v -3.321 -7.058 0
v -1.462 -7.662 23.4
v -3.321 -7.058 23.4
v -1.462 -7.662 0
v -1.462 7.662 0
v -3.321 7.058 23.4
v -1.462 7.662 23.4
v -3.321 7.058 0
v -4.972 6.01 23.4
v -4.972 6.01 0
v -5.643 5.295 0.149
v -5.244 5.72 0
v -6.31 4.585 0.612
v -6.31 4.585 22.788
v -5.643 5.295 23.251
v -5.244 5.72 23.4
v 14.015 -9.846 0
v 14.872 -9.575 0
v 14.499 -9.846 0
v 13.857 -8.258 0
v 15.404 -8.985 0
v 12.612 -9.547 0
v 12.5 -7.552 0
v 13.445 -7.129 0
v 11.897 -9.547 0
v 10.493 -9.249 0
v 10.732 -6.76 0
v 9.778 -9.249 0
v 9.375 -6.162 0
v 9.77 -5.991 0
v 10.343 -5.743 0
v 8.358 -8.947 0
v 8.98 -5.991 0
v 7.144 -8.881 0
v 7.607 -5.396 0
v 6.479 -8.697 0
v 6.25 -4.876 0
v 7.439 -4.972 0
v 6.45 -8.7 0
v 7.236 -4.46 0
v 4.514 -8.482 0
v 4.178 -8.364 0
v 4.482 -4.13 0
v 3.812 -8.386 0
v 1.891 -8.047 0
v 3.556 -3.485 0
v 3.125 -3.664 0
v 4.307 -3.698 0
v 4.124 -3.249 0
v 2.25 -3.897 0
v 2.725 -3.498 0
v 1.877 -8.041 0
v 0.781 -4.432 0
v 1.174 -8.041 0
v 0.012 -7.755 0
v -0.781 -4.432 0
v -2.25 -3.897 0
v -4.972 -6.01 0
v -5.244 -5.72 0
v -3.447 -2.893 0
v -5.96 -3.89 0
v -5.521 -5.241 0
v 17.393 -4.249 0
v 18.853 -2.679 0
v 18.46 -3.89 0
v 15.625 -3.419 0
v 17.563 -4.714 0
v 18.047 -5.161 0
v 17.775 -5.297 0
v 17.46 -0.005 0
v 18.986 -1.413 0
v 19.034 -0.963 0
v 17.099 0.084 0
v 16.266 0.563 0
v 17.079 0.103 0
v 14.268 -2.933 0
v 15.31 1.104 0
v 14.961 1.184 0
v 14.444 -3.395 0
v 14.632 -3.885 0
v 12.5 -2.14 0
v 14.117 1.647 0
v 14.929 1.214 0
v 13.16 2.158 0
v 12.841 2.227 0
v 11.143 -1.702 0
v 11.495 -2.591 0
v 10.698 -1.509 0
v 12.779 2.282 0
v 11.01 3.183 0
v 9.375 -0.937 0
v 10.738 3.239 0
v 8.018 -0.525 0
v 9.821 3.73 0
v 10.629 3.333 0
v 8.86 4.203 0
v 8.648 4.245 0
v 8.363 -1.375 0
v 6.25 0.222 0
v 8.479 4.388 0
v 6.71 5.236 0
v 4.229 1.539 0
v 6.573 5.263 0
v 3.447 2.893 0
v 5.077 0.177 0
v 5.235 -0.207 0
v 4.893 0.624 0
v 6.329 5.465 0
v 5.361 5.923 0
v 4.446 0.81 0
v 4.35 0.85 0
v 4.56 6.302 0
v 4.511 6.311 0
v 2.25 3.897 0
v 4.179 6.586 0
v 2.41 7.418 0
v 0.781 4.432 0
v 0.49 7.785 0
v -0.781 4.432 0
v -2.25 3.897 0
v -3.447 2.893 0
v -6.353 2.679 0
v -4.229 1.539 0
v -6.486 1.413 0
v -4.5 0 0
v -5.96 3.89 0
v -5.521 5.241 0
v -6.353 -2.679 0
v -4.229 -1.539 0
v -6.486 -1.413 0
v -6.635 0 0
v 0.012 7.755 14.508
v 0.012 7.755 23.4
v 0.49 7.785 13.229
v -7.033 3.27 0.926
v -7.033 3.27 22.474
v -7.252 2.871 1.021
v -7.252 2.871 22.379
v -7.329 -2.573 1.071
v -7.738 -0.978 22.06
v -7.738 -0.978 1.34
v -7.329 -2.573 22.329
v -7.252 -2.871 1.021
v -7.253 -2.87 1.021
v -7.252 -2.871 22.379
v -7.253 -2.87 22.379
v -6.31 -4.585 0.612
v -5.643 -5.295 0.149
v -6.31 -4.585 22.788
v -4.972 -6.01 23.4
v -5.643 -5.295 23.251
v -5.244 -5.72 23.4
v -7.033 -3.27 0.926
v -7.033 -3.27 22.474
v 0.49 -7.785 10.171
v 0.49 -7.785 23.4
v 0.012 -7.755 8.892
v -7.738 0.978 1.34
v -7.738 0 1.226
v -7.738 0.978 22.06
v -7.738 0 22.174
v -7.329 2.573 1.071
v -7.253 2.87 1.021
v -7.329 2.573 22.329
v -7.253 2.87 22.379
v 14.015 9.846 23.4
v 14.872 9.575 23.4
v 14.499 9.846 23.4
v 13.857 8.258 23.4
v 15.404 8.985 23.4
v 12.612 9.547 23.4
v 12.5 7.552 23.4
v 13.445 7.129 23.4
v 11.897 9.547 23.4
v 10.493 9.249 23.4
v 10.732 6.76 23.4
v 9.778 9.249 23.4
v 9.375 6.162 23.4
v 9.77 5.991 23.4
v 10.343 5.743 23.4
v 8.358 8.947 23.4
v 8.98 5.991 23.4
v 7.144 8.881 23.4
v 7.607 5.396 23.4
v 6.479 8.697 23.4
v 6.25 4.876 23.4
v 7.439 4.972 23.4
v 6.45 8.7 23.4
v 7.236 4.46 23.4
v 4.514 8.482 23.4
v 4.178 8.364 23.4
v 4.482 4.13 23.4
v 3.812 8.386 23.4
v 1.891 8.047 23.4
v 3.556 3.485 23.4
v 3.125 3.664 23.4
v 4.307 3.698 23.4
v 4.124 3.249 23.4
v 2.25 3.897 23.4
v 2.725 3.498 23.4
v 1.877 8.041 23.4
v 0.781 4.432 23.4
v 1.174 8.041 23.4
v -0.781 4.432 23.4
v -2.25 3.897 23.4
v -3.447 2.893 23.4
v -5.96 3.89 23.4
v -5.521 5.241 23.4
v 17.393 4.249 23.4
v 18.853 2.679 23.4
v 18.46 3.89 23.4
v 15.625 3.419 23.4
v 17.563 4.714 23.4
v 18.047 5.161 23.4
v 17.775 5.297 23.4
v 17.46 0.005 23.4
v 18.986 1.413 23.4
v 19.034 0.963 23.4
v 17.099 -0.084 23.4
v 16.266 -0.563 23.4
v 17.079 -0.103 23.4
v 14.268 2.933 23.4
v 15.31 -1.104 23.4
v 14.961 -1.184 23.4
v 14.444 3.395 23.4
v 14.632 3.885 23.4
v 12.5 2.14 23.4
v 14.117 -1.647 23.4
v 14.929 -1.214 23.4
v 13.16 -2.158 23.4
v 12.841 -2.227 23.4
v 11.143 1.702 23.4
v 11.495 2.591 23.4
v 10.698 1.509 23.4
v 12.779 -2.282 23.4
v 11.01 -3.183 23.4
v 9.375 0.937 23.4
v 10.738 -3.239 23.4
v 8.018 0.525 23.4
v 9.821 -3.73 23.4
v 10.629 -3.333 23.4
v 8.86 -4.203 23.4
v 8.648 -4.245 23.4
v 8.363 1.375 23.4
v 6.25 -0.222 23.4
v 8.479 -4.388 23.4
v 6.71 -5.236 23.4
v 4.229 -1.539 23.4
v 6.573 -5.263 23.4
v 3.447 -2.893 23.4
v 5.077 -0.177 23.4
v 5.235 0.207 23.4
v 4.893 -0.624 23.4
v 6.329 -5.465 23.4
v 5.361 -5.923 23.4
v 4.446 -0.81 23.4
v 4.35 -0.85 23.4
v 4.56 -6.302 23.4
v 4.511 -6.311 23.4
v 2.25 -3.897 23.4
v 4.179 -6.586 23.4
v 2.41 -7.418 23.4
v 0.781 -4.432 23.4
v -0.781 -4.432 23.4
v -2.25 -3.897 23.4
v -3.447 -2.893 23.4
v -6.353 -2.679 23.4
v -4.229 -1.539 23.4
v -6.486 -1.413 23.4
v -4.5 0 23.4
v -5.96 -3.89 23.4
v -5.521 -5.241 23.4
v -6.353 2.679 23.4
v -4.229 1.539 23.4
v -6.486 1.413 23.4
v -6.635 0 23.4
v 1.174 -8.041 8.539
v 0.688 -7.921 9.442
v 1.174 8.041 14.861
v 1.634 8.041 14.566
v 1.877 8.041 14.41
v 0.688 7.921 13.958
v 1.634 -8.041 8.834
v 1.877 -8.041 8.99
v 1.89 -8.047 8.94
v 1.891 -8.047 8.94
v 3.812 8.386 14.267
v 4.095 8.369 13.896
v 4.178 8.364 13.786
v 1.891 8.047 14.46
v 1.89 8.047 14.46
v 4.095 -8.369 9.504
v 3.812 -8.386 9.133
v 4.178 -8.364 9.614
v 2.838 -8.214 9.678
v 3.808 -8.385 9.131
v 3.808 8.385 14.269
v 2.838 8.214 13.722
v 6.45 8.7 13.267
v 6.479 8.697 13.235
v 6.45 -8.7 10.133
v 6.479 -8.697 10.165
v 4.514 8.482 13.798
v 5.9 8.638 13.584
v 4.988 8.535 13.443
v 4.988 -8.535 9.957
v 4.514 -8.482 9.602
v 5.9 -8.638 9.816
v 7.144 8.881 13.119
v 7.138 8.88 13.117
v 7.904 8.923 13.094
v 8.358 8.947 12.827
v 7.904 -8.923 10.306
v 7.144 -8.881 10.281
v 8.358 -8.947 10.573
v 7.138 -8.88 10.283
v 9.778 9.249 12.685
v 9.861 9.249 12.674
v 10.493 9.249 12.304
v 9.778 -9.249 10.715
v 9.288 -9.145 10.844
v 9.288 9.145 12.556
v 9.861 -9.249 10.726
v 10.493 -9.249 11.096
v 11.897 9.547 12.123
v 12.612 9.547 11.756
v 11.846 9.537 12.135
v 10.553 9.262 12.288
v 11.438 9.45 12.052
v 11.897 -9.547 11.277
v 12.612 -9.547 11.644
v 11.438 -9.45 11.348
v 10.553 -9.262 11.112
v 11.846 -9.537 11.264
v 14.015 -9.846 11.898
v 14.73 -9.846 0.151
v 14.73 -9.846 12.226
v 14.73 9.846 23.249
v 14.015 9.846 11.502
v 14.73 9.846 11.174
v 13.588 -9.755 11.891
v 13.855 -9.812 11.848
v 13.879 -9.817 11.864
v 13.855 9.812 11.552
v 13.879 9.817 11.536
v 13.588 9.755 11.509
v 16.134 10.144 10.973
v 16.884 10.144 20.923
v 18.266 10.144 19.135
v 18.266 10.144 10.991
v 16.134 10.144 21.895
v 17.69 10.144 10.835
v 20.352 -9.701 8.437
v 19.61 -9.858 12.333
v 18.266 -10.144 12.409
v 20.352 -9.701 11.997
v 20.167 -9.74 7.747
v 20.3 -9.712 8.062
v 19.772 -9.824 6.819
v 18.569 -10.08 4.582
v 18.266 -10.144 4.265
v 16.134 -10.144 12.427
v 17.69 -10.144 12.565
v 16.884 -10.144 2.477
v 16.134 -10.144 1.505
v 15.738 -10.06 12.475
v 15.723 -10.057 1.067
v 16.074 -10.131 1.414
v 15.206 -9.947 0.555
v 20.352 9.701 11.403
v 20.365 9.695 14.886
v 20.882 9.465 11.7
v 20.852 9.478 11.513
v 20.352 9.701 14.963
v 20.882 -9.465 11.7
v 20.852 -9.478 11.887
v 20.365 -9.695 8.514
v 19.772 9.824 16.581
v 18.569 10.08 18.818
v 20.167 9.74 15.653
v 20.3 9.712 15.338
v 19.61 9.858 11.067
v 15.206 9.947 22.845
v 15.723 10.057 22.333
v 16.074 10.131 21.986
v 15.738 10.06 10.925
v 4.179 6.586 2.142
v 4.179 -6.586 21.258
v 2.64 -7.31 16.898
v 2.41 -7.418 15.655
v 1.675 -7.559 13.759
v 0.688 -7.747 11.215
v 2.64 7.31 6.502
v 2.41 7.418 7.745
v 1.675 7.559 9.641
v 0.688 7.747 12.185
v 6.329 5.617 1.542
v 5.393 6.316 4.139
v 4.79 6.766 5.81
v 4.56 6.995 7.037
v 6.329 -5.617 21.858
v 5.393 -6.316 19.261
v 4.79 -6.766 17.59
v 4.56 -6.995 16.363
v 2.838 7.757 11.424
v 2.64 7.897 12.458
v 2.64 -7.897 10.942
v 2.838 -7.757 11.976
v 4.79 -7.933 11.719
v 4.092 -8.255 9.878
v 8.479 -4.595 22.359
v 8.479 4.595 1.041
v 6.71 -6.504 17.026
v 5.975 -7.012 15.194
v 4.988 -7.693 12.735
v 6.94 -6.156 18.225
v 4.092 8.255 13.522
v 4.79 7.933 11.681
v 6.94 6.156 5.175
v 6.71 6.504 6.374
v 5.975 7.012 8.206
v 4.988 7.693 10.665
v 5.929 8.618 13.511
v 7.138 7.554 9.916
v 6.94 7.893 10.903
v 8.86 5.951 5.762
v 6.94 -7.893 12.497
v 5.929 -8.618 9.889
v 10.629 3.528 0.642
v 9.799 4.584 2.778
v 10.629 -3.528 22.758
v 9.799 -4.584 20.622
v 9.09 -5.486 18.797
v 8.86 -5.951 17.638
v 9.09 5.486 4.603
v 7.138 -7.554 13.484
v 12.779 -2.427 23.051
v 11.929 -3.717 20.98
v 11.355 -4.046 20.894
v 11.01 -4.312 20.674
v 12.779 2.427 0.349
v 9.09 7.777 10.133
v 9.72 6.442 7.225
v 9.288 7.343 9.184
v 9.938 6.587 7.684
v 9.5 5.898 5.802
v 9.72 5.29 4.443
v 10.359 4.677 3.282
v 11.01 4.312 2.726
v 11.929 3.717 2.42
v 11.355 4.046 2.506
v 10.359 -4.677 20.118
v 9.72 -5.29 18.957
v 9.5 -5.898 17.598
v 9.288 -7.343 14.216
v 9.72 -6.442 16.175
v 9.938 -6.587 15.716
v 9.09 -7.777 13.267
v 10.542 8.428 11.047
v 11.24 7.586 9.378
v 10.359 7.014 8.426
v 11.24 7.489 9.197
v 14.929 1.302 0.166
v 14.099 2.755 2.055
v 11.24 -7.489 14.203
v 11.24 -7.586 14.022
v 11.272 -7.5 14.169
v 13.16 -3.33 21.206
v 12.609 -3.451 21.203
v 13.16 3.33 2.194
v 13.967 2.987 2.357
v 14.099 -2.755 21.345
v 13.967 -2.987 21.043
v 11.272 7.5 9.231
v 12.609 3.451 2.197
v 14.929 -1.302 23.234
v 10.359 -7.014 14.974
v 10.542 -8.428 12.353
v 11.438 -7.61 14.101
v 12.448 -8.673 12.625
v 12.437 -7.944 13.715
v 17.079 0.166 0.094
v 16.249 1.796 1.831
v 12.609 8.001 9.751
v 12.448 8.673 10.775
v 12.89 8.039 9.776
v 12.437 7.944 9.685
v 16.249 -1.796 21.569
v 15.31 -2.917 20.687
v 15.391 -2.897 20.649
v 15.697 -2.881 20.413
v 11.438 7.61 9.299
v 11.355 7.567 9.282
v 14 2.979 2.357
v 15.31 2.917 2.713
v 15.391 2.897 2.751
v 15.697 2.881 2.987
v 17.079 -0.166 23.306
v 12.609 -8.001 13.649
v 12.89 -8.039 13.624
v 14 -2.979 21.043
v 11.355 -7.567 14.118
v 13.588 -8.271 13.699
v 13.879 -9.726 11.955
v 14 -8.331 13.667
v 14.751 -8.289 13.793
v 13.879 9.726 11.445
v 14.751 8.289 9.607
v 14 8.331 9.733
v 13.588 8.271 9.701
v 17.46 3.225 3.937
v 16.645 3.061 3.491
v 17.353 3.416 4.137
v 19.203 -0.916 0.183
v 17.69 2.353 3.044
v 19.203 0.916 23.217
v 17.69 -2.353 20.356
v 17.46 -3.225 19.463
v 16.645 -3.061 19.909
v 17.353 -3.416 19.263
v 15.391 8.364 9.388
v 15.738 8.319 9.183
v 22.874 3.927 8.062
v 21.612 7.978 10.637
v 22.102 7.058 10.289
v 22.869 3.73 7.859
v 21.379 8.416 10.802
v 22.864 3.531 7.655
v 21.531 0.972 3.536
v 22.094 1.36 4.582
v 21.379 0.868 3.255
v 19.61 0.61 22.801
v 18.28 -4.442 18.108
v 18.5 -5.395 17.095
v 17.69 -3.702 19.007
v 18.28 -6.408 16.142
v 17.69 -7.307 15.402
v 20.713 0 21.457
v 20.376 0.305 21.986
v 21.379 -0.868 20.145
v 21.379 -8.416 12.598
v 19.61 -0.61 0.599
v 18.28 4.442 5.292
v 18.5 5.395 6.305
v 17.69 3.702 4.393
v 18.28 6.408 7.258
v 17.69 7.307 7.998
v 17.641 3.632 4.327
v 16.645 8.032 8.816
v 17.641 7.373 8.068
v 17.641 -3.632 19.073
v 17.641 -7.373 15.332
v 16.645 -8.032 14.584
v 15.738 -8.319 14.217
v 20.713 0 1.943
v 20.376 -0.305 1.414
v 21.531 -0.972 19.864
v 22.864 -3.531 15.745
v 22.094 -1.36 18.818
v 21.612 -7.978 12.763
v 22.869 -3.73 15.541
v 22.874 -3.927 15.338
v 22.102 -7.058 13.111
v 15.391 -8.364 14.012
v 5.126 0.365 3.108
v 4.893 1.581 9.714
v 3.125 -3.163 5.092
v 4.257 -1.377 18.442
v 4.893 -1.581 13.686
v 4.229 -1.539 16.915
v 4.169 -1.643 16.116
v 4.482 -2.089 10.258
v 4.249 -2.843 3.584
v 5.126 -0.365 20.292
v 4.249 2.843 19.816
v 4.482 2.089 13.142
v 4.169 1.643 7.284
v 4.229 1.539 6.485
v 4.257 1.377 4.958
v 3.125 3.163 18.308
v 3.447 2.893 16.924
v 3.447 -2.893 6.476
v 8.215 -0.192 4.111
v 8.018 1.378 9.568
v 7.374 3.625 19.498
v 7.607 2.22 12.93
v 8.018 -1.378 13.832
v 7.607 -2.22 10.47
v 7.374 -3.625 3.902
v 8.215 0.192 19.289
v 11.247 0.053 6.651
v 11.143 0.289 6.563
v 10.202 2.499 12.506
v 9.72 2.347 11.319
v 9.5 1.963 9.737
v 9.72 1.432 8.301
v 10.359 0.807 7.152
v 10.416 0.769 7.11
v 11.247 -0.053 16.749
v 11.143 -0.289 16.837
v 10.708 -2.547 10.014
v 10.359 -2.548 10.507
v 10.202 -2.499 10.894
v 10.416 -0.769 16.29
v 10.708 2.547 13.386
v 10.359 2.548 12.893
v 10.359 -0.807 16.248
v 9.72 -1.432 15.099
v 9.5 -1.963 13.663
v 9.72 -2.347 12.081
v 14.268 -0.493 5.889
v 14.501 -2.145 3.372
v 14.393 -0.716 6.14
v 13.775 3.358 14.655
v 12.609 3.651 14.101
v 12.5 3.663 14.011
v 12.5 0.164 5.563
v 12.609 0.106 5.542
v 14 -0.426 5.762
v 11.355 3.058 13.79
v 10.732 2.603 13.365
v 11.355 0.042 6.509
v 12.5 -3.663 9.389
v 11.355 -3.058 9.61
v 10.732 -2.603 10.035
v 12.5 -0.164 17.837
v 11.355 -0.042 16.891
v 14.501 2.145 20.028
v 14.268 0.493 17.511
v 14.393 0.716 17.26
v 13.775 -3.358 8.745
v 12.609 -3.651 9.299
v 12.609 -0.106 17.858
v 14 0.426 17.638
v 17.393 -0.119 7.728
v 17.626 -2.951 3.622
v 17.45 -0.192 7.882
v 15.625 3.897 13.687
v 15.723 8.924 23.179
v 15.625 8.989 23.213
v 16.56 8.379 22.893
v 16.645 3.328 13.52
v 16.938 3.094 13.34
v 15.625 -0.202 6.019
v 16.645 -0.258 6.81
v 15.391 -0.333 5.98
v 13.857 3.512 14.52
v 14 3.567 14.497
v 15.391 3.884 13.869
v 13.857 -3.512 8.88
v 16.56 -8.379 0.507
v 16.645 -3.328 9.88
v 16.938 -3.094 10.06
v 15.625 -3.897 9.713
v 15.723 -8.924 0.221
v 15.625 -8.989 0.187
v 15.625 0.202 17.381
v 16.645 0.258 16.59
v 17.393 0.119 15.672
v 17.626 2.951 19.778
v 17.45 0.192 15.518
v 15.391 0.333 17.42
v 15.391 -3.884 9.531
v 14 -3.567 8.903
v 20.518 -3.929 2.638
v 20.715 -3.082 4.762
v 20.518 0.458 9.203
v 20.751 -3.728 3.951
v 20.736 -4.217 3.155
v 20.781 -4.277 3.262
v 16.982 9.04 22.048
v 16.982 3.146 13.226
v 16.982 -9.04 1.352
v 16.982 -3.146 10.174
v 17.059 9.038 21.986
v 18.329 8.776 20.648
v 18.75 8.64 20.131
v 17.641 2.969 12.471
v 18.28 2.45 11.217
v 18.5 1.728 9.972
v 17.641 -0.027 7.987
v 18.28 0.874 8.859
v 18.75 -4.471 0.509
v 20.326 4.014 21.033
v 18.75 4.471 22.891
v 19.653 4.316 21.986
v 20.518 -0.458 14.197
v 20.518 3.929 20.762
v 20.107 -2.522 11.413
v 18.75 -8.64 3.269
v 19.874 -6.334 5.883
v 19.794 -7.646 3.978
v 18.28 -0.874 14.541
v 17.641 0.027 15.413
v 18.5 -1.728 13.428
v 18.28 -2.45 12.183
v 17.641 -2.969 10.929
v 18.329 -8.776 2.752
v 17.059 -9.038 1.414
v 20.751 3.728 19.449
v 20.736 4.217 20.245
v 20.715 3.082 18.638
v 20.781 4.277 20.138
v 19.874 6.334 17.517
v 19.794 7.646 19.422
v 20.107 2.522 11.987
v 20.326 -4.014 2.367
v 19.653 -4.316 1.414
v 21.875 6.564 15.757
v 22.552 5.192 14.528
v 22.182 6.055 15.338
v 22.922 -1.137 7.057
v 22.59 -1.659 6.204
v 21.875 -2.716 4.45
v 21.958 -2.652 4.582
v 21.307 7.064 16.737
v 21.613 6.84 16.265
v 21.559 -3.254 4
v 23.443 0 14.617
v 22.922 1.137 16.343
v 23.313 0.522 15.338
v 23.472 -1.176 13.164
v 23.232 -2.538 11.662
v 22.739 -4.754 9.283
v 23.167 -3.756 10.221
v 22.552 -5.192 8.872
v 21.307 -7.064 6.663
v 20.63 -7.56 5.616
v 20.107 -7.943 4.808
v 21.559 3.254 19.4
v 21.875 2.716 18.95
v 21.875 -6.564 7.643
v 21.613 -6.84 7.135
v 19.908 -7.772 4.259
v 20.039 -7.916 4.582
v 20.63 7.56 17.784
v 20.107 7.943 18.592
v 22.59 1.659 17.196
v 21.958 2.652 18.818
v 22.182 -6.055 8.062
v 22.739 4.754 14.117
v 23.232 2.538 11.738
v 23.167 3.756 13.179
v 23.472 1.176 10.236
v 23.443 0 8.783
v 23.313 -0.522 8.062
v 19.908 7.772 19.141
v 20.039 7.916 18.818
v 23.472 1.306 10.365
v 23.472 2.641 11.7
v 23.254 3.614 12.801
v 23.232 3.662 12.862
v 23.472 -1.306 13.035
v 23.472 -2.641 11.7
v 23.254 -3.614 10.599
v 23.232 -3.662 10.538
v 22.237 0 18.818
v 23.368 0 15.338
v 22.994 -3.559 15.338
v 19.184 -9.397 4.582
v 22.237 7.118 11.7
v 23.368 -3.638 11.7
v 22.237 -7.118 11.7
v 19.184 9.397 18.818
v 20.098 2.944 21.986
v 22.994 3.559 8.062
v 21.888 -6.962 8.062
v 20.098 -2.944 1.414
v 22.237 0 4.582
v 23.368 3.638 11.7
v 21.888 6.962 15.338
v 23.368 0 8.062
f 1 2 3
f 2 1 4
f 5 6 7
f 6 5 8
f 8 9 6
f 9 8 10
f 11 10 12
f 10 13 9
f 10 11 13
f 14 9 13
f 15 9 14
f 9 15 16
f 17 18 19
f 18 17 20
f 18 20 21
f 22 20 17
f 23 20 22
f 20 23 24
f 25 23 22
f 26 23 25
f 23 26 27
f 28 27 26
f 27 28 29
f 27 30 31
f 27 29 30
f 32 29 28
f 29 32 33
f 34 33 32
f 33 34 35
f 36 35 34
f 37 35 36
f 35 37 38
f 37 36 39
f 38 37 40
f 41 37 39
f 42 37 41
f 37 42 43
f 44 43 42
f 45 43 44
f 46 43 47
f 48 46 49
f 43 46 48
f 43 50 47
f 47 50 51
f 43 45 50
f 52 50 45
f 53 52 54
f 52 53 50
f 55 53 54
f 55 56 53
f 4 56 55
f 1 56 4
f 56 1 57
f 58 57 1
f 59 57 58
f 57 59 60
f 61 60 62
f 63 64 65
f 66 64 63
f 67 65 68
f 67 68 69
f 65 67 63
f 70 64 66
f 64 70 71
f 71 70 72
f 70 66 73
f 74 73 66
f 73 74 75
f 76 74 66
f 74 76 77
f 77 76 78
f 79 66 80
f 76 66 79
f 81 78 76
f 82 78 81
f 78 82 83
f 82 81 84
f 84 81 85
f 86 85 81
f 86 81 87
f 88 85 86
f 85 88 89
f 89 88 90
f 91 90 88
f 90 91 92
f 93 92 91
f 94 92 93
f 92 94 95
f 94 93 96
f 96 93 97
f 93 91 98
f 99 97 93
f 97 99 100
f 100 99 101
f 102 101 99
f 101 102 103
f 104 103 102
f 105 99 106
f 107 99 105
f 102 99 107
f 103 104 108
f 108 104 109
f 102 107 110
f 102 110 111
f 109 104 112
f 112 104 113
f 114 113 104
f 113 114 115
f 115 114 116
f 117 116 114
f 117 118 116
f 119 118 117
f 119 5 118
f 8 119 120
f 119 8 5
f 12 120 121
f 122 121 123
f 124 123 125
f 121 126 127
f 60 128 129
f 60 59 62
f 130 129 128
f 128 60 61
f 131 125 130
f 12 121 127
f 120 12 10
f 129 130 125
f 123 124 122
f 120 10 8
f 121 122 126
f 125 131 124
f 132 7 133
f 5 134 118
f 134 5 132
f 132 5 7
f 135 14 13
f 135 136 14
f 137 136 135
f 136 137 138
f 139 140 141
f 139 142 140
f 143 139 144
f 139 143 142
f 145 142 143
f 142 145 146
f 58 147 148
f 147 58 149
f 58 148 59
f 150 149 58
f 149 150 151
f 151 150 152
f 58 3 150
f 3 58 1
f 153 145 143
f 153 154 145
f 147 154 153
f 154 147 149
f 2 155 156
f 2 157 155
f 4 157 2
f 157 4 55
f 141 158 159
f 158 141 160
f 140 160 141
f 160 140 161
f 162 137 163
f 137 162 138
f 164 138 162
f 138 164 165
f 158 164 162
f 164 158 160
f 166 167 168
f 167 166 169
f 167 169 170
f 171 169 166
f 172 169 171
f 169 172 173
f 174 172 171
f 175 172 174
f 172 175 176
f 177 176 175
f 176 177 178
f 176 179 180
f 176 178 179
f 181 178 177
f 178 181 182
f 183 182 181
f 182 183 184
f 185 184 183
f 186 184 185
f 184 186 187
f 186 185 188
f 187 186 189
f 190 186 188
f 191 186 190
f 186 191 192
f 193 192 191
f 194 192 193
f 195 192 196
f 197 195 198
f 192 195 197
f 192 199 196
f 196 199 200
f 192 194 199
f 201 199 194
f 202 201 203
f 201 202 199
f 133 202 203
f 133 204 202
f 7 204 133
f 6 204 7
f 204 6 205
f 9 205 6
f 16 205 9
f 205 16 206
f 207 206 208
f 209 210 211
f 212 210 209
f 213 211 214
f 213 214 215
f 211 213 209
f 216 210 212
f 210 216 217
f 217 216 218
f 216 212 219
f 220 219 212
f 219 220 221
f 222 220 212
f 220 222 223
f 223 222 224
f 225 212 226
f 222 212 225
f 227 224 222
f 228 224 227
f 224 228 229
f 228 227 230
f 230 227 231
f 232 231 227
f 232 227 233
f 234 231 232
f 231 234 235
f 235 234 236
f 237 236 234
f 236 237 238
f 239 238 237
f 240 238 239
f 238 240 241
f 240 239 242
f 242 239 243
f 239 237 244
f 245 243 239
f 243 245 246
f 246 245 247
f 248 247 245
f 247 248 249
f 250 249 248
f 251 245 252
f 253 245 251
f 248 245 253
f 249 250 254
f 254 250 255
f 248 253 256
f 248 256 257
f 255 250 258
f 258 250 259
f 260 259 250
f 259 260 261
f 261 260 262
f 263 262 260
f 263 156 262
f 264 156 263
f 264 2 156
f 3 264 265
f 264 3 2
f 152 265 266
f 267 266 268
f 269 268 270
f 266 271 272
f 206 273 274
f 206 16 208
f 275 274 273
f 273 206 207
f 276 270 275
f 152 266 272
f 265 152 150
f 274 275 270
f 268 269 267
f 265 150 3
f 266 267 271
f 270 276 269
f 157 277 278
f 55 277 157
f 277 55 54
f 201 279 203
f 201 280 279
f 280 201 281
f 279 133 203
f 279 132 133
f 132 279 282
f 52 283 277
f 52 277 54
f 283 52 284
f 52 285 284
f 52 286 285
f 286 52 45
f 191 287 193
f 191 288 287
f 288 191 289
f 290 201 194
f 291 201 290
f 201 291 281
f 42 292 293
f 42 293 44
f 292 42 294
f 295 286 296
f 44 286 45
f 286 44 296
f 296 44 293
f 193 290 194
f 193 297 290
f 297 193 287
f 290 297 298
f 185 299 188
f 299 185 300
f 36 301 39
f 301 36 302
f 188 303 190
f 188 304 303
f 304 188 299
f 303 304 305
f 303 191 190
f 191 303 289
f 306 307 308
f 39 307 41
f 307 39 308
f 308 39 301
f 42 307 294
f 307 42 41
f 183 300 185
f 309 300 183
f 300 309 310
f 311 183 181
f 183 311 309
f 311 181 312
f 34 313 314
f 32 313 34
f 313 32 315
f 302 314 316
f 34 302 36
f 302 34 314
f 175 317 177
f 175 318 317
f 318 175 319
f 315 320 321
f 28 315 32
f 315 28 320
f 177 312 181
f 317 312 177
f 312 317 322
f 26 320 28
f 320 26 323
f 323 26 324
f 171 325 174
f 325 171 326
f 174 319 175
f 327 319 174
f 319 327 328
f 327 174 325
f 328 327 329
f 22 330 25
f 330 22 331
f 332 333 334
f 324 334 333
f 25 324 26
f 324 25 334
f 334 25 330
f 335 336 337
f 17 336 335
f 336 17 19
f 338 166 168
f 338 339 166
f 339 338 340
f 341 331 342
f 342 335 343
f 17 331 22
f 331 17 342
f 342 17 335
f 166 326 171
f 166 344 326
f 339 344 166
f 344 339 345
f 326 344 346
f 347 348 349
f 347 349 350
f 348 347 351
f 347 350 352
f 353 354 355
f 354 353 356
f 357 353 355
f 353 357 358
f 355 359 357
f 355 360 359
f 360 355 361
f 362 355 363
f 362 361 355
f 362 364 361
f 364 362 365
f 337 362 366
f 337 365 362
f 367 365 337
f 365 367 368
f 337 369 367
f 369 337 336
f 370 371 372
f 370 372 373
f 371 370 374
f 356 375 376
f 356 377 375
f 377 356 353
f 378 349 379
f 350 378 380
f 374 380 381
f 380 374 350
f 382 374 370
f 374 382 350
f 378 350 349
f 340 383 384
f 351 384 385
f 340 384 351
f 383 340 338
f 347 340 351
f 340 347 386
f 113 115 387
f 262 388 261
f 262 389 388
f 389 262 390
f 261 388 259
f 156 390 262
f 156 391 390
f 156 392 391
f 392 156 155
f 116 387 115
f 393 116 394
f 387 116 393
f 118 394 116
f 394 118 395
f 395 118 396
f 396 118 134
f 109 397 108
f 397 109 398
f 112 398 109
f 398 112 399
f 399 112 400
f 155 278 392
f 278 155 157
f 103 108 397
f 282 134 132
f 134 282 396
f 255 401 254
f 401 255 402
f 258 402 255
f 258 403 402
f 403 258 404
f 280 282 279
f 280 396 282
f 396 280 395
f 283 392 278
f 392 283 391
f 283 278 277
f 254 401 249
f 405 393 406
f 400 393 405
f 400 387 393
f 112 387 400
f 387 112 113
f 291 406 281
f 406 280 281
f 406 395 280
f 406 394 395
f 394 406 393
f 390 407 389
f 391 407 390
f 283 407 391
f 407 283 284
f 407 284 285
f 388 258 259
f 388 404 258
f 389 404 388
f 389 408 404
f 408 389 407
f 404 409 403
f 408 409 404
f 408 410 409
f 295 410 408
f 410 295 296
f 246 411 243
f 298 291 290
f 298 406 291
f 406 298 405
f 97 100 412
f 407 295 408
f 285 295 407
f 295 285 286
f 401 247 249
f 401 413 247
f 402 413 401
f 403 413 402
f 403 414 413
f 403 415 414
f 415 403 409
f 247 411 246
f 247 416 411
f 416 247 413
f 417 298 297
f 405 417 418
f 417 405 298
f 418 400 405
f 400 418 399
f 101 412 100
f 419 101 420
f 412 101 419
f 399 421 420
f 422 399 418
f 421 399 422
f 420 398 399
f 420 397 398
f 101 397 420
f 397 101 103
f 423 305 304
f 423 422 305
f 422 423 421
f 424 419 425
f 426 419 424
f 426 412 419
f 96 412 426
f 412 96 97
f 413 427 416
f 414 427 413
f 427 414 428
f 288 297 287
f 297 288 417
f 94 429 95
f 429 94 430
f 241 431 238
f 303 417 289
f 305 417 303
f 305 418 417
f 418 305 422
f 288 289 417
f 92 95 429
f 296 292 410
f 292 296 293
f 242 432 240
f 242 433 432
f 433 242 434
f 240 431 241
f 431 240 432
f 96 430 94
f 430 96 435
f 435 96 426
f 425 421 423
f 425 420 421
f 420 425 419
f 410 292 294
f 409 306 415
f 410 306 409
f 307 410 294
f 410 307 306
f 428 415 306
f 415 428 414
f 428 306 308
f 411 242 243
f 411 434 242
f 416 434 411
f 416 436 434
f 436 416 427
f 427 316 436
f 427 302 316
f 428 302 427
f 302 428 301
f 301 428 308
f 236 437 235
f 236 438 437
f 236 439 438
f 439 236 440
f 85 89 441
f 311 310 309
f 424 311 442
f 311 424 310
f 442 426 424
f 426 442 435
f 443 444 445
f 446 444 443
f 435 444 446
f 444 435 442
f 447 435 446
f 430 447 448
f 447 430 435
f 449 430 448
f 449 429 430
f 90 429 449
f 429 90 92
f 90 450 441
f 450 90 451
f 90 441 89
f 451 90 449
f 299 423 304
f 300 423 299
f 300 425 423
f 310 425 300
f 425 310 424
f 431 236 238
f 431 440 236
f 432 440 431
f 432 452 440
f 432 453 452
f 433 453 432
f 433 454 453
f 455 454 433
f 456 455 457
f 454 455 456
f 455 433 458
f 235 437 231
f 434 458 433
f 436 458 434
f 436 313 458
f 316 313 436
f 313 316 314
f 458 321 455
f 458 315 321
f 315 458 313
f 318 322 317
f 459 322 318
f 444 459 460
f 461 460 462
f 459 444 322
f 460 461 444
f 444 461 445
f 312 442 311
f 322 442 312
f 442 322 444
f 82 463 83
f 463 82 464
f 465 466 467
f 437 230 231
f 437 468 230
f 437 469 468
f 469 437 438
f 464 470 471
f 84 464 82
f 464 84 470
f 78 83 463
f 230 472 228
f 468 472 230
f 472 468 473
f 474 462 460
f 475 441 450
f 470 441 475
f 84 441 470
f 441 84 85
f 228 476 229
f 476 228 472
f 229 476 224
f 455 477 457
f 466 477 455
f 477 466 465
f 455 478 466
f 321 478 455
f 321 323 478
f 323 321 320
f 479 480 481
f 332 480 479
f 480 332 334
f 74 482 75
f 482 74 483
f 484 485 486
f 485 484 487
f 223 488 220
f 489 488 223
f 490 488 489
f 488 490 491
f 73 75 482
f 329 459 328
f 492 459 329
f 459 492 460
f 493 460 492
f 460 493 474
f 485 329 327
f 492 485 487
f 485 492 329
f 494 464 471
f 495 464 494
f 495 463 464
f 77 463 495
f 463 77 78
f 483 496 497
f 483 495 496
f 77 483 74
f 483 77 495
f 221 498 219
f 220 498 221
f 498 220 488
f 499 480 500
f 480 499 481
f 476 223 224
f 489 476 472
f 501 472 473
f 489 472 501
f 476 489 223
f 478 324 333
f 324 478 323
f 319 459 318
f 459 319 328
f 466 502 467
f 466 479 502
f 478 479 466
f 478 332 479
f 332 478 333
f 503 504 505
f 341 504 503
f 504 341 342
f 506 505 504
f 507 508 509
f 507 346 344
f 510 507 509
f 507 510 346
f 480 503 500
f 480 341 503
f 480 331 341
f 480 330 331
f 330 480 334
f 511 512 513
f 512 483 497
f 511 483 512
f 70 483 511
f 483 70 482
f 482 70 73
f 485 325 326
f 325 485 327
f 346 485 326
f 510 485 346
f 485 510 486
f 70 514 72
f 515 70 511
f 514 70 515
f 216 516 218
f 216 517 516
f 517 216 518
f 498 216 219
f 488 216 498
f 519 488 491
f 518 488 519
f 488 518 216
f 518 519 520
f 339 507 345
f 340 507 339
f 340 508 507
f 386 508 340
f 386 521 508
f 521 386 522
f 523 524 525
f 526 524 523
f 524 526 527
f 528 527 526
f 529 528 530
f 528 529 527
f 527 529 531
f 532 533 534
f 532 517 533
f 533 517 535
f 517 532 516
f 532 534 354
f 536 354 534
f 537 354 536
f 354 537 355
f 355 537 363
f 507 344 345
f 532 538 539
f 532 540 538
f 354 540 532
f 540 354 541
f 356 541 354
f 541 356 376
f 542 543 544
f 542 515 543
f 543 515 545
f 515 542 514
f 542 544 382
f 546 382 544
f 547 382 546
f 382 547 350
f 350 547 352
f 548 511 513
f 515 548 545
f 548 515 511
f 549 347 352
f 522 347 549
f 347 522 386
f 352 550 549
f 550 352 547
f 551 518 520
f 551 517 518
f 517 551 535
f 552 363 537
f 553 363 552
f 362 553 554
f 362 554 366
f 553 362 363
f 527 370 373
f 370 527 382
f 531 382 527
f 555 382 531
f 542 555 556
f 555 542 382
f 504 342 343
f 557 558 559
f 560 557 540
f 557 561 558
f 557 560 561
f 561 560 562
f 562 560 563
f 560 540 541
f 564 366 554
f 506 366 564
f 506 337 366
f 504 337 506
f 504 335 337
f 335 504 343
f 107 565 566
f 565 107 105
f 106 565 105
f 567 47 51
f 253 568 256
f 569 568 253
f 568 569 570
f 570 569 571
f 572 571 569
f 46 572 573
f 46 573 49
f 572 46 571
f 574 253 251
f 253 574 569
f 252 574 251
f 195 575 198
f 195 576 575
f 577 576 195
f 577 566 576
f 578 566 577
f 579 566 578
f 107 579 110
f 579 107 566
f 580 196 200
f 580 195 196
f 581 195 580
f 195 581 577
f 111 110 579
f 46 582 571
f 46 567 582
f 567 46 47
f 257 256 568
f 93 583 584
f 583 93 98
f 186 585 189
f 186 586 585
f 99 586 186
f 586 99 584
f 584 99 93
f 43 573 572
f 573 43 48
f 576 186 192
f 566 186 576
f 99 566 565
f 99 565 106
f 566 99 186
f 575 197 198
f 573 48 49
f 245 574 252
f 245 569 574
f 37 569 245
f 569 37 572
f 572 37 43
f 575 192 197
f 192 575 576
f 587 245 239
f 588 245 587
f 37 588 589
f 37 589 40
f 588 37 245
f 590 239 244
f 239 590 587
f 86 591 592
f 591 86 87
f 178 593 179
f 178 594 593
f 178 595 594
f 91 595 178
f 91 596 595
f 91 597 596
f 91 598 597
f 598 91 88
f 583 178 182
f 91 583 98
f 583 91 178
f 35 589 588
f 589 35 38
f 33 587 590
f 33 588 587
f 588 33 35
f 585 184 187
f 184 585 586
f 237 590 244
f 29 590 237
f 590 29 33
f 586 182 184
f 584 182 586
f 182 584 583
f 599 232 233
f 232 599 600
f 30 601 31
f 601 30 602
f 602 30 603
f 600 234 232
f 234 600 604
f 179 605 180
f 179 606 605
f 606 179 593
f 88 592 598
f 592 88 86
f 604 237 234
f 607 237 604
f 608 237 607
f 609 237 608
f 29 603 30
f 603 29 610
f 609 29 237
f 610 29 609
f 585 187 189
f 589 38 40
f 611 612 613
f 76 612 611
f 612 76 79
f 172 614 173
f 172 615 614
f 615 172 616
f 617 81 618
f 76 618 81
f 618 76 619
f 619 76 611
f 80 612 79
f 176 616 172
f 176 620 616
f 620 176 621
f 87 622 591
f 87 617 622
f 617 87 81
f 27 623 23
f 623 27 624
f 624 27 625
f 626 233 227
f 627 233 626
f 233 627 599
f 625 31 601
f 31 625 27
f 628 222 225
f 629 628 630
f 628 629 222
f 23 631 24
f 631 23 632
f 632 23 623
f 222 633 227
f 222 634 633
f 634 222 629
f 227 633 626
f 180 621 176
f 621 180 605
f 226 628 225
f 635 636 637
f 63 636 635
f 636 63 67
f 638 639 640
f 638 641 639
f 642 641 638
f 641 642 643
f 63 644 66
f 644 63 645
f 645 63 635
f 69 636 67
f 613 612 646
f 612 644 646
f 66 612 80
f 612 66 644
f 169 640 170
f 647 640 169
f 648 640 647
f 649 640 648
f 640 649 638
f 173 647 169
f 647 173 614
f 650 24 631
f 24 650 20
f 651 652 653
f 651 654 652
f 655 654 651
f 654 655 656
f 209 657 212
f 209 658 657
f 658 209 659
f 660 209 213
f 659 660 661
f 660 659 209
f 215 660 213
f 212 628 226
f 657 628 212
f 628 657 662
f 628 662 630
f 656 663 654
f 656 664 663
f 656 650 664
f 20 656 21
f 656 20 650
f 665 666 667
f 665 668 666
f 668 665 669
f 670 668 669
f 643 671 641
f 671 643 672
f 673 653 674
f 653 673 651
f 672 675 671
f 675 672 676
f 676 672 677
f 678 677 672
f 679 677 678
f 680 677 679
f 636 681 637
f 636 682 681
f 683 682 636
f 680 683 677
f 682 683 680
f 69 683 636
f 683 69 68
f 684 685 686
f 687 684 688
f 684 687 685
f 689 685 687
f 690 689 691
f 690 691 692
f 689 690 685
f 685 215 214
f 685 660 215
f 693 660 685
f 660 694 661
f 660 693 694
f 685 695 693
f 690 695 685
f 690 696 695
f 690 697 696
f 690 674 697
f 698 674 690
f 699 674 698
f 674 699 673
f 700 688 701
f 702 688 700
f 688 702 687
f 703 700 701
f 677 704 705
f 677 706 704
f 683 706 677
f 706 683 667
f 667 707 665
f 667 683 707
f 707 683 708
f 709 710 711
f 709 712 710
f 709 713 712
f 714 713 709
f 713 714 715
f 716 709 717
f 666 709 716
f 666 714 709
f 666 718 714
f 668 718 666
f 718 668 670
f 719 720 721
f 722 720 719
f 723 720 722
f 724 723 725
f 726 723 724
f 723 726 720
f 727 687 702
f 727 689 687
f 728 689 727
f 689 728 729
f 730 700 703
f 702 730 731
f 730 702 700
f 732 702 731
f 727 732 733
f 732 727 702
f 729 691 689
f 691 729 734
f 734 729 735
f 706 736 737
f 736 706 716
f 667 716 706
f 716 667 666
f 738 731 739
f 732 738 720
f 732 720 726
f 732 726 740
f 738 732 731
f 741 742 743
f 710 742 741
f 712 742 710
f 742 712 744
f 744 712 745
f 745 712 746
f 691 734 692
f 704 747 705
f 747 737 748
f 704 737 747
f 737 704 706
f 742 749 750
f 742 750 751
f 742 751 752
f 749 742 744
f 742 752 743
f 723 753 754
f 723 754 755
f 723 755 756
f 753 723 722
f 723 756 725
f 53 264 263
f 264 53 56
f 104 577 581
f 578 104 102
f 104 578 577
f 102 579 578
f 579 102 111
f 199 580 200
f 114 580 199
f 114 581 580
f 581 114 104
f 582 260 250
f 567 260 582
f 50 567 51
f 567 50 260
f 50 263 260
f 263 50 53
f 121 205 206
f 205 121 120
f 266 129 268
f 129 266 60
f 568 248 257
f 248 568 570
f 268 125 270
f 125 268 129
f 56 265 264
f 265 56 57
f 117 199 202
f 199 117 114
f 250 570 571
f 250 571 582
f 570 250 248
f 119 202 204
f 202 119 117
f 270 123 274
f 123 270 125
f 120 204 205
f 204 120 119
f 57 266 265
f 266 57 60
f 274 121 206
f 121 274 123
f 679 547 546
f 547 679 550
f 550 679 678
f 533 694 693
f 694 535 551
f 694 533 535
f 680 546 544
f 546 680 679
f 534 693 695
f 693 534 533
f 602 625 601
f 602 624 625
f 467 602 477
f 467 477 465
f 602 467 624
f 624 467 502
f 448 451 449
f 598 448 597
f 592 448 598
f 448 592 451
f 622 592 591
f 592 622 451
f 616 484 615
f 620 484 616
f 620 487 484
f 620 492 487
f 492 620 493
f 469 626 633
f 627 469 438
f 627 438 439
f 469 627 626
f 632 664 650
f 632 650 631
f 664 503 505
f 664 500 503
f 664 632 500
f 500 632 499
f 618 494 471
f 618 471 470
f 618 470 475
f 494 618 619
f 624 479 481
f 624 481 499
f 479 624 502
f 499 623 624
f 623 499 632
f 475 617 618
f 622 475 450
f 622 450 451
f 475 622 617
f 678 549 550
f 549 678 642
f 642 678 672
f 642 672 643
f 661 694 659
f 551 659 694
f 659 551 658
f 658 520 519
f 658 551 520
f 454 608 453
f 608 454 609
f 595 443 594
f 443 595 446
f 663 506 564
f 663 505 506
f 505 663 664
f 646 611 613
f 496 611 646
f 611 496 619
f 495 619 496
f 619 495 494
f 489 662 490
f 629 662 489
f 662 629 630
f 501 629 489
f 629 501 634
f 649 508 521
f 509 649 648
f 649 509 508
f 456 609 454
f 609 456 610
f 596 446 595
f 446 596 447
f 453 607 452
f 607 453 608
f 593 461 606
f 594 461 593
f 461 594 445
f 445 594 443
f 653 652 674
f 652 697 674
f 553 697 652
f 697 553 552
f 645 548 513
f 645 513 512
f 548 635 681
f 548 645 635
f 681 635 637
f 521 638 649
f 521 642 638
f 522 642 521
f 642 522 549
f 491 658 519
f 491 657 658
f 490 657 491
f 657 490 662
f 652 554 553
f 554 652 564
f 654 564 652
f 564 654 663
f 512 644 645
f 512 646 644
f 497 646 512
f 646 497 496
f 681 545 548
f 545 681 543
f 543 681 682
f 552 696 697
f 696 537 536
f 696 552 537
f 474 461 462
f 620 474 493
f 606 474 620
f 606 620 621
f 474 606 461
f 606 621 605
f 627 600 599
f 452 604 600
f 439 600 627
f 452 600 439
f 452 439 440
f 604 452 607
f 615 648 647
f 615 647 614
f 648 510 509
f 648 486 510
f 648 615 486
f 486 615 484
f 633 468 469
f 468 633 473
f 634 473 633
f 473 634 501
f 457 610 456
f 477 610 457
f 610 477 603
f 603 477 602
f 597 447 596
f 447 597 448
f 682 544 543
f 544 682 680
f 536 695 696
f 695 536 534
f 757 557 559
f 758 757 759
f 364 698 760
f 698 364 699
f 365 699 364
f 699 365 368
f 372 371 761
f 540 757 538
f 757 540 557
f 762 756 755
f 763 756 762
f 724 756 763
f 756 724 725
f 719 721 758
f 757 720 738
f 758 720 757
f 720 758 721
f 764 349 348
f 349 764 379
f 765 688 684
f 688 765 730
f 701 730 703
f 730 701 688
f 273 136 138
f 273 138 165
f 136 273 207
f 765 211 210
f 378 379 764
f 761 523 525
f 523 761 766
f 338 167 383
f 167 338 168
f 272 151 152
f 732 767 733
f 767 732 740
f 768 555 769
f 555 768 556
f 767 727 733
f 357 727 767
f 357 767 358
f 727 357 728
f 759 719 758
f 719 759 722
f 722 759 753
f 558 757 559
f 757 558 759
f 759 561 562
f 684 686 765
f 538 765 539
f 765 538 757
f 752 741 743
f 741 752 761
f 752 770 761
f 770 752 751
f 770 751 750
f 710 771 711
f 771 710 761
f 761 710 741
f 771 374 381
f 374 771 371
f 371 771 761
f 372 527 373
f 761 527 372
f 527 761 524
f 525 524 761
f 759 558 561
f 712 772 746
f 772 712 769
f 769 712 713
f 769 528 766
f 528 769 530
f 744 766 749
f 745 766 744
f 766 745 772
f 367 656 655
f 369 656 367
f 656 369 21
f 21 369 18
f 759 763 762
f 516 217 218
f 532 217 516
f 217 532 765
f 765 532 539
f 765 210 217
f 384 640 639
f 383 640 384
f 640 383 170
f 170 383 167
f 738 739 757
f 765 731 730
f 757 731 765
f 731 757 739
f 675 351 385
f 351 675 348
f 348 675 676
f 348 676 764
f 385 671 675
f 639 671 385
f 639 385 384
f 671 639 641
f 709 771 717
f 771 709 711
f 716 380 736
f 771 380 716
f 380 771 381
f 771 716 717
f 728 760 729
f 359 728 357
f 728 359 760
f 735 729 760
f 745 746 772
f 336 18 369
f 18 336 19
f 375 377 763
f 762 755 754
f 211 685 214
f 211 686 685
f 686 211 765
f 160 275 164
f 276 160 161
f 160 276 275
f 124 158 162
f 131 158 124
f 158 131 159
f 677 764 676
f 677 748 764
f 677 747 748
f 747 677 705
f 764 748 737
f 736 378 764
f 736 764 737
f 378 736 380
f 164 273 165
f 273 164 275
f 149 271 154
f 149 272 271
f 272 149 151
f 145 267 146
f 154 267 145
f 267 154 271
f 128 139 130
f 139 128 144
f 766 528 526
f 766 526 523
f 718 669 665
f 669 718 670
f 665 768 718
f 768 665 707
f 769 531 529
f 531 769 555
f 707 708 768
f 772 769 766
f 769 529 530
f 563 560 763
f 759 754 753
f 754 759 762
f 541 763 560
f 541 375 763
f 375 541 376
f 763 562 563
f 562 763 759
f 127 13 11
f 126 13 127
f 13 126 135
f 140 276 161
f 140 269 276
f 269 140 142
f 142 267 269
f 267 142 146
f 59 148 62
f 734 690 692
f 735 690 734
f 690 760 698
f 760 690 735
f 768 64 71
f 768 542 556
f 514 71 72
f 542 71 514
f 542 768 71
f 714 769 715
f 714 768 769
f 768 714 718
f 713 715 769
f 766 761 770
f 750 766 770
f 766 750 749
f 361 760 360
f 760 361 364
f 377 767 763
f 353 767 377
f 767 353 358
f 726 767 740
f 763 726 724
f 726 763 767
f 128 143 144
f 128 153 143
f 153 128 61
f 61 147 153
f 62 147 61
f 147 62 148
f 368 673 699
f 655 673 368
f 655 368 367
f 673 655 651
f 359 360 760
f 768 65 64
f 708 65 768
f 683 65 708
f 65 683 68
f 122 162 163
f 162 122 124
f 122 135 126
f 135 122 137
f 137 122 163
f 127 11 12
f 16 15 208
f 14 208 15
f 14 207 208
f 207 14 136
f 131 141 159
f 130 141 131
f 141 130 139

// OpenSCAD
// file: functions.scad
// PRUSA Mendel  
// Functions used in many files
// GNU GPL v3
// Josef Průša
// josefprusa@me.com
// prusadjs.cz
// http://www.reprap.org/wiki/Prusa_Mendel
// http://github.com/prusajr/PrusaMendel


module nut(d,h,horizontal=true){
cornerdiameter =  (d / 2) / cos (180 / 6);
cylinder(h = h, r = cornerdiameter, $fn = 6);
if(horizontal){
for(i = [1:6]){
	rotate([0,0,60*i]) translate([-cornerdiameter-0.2,0,0]) rotate([0,0,-45]) cube(size = [2,2,h]);
}}
}

// Based on nophead research
module polyhole(d,h) {
    n = max(round(2 * d),3);
    rotate([0,0,180])
        cylinder(h = h, r = (d / 2) / cos (180 / n), $fn = n);
}




module roundcorner(diameter){
	difference(){
		cube(size = [diameter,diameter,99], center = false);
		translate(v = [diameter, diameter, 0]) cylinder(h = 100, r=diameter, center=true);
	}
}
// file: metric.scad
// PRUSA Mendel  
// Default metric sizes
// GNU GPL v3
// Josef Průša
// josefprusa@me.com
// prusadjs.cz
// http://www.reprap.org/wiki/Prusa_Mendel
// http://github.com/prusajr/PrusaMendel

// DONT CHANGE THIS FILE! ALTER VALUES IN CONFIGURATION.SCAD INSTEAD

// RODS

threaded_rod_diameter = 8.7;
threaded_rod_diameter_horizontal = 8.7;
smooth_bar_diameter = 8;
smooth_bar_diameter_horizontal = 8.5;

// Nuts and bolts

m8_diameter = 9;
m8_nut_diameter = 14.1;

m4_diameter = 4.5;
m4_nut_diameter = 9;

m3_diameter = 3.6;
m3_nut_diameter = 5.3;
m3_nut_diameter_horizontal = 6.1;

// Bushing holder

bushing_core_diameter = smooth_bar_diameter;
bushing_material_thickness = 1;

// Motors

motor_shaft = 5.5;
// file: teardrop.scad
teardrop();

module teardrop (r=4.5,h=20,top_and_bottom=false)
{
	rotate([-270,0,90])
	linear_extrude(height=h,convexity=10)
	{
		circle(r=r, $fn = 24);
		polygon(points=[[0,0],[r*cos(30),r*sin(30)],[0.5*r,r],[-0.5*r,r],[-r*cos(30),r*sin(30)]],
				paths=[[0,1,2,3,4]]);
		if (top_and_bottom)
		polygon(points=[[0,0],[r*cos(30),-r*sin(30)],[0.5*r,-r],[-0.5*r,-r],[-r*cos(30),-r*sin(30)]],
				paths=[[0,1,2,3,4]]);
		
	}
}

module teardropcentering (r=4.5,h=20)
{
	rotate([-270,0,90])
	linear_extrude(height=h)
	{
		circle(r=r, $fn = 24);
		polygon(points=[[0,0],[r*cos(30),r*sin(30)],[0.5*r,1.2*r],[-0.5*r,1.2*r],[-r*cos(30),r*sin(30)]],
				paths=[[0,1,2,3,4]]);
	}
}

module teardropcentering2 (r=4.5,h=20)
{
	//rotate([-270,0,90])
	difference(){
	linear_extrude(height=h)
	{
		circle(r=r, $fn = 24);
		polygon(points=[[0,0],[r*cos(30),r*sin(30)],[0.5*r,1.2*r],[-0.5*r,1.2*r],[-r*cos(30),r*sin(30)]],
				paths=[[0,1,2,3,4]]);
	}
	translate(v = [-1.5*r, -1.5*r,-1])cube(size =[3*r,1.5*r,h+2]);
	}
}
// file: configuration.scad
// PRUSA Mendel  
// Configuration file
// GNU GPL v3
// Josef Průša
// josefprusa@me.com
// prusadjs.cz
// http://www.reprap.org/wiki/Prusa_Mendel
// http://github.com/prusajr/PrusaMendel

// PLEASE SELECT ONE OF THE CONFIGURATIONS BELOW
// BY UN-COMMENTING IT

// Uncomment for metric settings
// METRIC METRIC METRIC METRIC METRIC METRIC METRIC METRIC 

include <metric.scad>;

// CUSTOM CUSTOM CUSTOM CUSTOM CUSTOM CUSTOM CUSTOM CUSTOM CUSTOM

thin_wall = 3;


// Linear bearing version
linear = false;
// set false for LM-8UU, true for LM-E-8UU (ignore if linear is set to false)
lme8uu = false;



// CHANGE ONLY THE STUFF YOU KNOW
// IT WILL REPLACE DEFAULT SETTING

// RODS

// threaded_rod_diameter = 0;
// threaded_rod_diameter_horizontal = 0;
// smooth_bar_diameter = 0;
// smooth_bar_diameter_horizontal = 0;

// Nuts and bolts

// m8_diameter = 0;
// m8_nut_diameter = 0;

// m4_diameter = 0;
// m4_nut_diameter = 0;

// m3_diameter = 0;
// m3_nut_diameter = 0;

// Bushing holder

// bushing_core_diameter = smooth_bar_diameter;
// bushing_material_thickness = 0;


///counted stuff
m3_nut_diameter_bigger = ((m3_nut_diameter  / 2) / cos (180 / 6))*2;

// functions 
include <functions.scad>
// main file
// PRUSA Mendel  
// Bar clamp
// Used for joining 8mm rods
// GNU GPL v2
// Josef Průša
// josefprusa@me.com
// prusadjs.cz
// http://www.reprap.org/wiki/Prusa_Mendel
// http://github.com/prusajr/PrusaMendel

include <configuration.scad>
use <teardrop.scad>


module barclampCross(a=45) {
	genWallThickness = 3.3;
	outer_radius=m8_diameter/2+genWallThickness;
	clamp_width = outer_radius*2;
	clamp_length=25;
	clamp_height=3*outer_radius;
	axe_dist = 5;
	slot_width=5;
 
 	steps = 8;

 	translate([0, 0, clamp_height/2]) 
 	
 	intersection() {
 		translate([clamp_length/4, 0, 0]) 
 			sphere(r=clamp_length*7/10);

 		intersection() {
	 		union() {
	 			for (i=[0:steps]) {
	 				translate([i*(clamp_length-outer_radius)/steps, 0, 0])
	 					cylinder(h=clamp_height,r=outer_radius+i*0.3,center=true);
	 			}
	 			
	 		}

	 		difference() {
		 		union(){
		 			for (i=[0:steps]) {
						translate([i*(clamp_length-outer_radius)/steps, 0, 0]) rotate(a=-i*a/steps,v=[1,0,0]) 
							cylinder(h=clamp_height*10,r=outer_radius,center=true);
					}
		 			
		 		}
		 		union() {
			 		for (i=[0:steps]) {
						translate([i*clamp_length/steps, 0, 0]) rotate(a=-i*a/steps,v=[1,0,0]) 
							cylinder(r=slot_width/2, h=clamp_height*2, center=true);
					}


					#cylinder(h=clamp_height*2,r=m8_diameter/2,$fn=18,center=true);

					translate([axe_dist+m8_diameter,0,0]) rotate([a,0,0]) 
					#cylinder(h=(clamp_width/cos(a)),r=m8_diameter/2,$fn=20,center=true);
			 	}
		 	}
	 	}
 	}
 	
 	
 	
 	
}
barclampCross(a=45);
